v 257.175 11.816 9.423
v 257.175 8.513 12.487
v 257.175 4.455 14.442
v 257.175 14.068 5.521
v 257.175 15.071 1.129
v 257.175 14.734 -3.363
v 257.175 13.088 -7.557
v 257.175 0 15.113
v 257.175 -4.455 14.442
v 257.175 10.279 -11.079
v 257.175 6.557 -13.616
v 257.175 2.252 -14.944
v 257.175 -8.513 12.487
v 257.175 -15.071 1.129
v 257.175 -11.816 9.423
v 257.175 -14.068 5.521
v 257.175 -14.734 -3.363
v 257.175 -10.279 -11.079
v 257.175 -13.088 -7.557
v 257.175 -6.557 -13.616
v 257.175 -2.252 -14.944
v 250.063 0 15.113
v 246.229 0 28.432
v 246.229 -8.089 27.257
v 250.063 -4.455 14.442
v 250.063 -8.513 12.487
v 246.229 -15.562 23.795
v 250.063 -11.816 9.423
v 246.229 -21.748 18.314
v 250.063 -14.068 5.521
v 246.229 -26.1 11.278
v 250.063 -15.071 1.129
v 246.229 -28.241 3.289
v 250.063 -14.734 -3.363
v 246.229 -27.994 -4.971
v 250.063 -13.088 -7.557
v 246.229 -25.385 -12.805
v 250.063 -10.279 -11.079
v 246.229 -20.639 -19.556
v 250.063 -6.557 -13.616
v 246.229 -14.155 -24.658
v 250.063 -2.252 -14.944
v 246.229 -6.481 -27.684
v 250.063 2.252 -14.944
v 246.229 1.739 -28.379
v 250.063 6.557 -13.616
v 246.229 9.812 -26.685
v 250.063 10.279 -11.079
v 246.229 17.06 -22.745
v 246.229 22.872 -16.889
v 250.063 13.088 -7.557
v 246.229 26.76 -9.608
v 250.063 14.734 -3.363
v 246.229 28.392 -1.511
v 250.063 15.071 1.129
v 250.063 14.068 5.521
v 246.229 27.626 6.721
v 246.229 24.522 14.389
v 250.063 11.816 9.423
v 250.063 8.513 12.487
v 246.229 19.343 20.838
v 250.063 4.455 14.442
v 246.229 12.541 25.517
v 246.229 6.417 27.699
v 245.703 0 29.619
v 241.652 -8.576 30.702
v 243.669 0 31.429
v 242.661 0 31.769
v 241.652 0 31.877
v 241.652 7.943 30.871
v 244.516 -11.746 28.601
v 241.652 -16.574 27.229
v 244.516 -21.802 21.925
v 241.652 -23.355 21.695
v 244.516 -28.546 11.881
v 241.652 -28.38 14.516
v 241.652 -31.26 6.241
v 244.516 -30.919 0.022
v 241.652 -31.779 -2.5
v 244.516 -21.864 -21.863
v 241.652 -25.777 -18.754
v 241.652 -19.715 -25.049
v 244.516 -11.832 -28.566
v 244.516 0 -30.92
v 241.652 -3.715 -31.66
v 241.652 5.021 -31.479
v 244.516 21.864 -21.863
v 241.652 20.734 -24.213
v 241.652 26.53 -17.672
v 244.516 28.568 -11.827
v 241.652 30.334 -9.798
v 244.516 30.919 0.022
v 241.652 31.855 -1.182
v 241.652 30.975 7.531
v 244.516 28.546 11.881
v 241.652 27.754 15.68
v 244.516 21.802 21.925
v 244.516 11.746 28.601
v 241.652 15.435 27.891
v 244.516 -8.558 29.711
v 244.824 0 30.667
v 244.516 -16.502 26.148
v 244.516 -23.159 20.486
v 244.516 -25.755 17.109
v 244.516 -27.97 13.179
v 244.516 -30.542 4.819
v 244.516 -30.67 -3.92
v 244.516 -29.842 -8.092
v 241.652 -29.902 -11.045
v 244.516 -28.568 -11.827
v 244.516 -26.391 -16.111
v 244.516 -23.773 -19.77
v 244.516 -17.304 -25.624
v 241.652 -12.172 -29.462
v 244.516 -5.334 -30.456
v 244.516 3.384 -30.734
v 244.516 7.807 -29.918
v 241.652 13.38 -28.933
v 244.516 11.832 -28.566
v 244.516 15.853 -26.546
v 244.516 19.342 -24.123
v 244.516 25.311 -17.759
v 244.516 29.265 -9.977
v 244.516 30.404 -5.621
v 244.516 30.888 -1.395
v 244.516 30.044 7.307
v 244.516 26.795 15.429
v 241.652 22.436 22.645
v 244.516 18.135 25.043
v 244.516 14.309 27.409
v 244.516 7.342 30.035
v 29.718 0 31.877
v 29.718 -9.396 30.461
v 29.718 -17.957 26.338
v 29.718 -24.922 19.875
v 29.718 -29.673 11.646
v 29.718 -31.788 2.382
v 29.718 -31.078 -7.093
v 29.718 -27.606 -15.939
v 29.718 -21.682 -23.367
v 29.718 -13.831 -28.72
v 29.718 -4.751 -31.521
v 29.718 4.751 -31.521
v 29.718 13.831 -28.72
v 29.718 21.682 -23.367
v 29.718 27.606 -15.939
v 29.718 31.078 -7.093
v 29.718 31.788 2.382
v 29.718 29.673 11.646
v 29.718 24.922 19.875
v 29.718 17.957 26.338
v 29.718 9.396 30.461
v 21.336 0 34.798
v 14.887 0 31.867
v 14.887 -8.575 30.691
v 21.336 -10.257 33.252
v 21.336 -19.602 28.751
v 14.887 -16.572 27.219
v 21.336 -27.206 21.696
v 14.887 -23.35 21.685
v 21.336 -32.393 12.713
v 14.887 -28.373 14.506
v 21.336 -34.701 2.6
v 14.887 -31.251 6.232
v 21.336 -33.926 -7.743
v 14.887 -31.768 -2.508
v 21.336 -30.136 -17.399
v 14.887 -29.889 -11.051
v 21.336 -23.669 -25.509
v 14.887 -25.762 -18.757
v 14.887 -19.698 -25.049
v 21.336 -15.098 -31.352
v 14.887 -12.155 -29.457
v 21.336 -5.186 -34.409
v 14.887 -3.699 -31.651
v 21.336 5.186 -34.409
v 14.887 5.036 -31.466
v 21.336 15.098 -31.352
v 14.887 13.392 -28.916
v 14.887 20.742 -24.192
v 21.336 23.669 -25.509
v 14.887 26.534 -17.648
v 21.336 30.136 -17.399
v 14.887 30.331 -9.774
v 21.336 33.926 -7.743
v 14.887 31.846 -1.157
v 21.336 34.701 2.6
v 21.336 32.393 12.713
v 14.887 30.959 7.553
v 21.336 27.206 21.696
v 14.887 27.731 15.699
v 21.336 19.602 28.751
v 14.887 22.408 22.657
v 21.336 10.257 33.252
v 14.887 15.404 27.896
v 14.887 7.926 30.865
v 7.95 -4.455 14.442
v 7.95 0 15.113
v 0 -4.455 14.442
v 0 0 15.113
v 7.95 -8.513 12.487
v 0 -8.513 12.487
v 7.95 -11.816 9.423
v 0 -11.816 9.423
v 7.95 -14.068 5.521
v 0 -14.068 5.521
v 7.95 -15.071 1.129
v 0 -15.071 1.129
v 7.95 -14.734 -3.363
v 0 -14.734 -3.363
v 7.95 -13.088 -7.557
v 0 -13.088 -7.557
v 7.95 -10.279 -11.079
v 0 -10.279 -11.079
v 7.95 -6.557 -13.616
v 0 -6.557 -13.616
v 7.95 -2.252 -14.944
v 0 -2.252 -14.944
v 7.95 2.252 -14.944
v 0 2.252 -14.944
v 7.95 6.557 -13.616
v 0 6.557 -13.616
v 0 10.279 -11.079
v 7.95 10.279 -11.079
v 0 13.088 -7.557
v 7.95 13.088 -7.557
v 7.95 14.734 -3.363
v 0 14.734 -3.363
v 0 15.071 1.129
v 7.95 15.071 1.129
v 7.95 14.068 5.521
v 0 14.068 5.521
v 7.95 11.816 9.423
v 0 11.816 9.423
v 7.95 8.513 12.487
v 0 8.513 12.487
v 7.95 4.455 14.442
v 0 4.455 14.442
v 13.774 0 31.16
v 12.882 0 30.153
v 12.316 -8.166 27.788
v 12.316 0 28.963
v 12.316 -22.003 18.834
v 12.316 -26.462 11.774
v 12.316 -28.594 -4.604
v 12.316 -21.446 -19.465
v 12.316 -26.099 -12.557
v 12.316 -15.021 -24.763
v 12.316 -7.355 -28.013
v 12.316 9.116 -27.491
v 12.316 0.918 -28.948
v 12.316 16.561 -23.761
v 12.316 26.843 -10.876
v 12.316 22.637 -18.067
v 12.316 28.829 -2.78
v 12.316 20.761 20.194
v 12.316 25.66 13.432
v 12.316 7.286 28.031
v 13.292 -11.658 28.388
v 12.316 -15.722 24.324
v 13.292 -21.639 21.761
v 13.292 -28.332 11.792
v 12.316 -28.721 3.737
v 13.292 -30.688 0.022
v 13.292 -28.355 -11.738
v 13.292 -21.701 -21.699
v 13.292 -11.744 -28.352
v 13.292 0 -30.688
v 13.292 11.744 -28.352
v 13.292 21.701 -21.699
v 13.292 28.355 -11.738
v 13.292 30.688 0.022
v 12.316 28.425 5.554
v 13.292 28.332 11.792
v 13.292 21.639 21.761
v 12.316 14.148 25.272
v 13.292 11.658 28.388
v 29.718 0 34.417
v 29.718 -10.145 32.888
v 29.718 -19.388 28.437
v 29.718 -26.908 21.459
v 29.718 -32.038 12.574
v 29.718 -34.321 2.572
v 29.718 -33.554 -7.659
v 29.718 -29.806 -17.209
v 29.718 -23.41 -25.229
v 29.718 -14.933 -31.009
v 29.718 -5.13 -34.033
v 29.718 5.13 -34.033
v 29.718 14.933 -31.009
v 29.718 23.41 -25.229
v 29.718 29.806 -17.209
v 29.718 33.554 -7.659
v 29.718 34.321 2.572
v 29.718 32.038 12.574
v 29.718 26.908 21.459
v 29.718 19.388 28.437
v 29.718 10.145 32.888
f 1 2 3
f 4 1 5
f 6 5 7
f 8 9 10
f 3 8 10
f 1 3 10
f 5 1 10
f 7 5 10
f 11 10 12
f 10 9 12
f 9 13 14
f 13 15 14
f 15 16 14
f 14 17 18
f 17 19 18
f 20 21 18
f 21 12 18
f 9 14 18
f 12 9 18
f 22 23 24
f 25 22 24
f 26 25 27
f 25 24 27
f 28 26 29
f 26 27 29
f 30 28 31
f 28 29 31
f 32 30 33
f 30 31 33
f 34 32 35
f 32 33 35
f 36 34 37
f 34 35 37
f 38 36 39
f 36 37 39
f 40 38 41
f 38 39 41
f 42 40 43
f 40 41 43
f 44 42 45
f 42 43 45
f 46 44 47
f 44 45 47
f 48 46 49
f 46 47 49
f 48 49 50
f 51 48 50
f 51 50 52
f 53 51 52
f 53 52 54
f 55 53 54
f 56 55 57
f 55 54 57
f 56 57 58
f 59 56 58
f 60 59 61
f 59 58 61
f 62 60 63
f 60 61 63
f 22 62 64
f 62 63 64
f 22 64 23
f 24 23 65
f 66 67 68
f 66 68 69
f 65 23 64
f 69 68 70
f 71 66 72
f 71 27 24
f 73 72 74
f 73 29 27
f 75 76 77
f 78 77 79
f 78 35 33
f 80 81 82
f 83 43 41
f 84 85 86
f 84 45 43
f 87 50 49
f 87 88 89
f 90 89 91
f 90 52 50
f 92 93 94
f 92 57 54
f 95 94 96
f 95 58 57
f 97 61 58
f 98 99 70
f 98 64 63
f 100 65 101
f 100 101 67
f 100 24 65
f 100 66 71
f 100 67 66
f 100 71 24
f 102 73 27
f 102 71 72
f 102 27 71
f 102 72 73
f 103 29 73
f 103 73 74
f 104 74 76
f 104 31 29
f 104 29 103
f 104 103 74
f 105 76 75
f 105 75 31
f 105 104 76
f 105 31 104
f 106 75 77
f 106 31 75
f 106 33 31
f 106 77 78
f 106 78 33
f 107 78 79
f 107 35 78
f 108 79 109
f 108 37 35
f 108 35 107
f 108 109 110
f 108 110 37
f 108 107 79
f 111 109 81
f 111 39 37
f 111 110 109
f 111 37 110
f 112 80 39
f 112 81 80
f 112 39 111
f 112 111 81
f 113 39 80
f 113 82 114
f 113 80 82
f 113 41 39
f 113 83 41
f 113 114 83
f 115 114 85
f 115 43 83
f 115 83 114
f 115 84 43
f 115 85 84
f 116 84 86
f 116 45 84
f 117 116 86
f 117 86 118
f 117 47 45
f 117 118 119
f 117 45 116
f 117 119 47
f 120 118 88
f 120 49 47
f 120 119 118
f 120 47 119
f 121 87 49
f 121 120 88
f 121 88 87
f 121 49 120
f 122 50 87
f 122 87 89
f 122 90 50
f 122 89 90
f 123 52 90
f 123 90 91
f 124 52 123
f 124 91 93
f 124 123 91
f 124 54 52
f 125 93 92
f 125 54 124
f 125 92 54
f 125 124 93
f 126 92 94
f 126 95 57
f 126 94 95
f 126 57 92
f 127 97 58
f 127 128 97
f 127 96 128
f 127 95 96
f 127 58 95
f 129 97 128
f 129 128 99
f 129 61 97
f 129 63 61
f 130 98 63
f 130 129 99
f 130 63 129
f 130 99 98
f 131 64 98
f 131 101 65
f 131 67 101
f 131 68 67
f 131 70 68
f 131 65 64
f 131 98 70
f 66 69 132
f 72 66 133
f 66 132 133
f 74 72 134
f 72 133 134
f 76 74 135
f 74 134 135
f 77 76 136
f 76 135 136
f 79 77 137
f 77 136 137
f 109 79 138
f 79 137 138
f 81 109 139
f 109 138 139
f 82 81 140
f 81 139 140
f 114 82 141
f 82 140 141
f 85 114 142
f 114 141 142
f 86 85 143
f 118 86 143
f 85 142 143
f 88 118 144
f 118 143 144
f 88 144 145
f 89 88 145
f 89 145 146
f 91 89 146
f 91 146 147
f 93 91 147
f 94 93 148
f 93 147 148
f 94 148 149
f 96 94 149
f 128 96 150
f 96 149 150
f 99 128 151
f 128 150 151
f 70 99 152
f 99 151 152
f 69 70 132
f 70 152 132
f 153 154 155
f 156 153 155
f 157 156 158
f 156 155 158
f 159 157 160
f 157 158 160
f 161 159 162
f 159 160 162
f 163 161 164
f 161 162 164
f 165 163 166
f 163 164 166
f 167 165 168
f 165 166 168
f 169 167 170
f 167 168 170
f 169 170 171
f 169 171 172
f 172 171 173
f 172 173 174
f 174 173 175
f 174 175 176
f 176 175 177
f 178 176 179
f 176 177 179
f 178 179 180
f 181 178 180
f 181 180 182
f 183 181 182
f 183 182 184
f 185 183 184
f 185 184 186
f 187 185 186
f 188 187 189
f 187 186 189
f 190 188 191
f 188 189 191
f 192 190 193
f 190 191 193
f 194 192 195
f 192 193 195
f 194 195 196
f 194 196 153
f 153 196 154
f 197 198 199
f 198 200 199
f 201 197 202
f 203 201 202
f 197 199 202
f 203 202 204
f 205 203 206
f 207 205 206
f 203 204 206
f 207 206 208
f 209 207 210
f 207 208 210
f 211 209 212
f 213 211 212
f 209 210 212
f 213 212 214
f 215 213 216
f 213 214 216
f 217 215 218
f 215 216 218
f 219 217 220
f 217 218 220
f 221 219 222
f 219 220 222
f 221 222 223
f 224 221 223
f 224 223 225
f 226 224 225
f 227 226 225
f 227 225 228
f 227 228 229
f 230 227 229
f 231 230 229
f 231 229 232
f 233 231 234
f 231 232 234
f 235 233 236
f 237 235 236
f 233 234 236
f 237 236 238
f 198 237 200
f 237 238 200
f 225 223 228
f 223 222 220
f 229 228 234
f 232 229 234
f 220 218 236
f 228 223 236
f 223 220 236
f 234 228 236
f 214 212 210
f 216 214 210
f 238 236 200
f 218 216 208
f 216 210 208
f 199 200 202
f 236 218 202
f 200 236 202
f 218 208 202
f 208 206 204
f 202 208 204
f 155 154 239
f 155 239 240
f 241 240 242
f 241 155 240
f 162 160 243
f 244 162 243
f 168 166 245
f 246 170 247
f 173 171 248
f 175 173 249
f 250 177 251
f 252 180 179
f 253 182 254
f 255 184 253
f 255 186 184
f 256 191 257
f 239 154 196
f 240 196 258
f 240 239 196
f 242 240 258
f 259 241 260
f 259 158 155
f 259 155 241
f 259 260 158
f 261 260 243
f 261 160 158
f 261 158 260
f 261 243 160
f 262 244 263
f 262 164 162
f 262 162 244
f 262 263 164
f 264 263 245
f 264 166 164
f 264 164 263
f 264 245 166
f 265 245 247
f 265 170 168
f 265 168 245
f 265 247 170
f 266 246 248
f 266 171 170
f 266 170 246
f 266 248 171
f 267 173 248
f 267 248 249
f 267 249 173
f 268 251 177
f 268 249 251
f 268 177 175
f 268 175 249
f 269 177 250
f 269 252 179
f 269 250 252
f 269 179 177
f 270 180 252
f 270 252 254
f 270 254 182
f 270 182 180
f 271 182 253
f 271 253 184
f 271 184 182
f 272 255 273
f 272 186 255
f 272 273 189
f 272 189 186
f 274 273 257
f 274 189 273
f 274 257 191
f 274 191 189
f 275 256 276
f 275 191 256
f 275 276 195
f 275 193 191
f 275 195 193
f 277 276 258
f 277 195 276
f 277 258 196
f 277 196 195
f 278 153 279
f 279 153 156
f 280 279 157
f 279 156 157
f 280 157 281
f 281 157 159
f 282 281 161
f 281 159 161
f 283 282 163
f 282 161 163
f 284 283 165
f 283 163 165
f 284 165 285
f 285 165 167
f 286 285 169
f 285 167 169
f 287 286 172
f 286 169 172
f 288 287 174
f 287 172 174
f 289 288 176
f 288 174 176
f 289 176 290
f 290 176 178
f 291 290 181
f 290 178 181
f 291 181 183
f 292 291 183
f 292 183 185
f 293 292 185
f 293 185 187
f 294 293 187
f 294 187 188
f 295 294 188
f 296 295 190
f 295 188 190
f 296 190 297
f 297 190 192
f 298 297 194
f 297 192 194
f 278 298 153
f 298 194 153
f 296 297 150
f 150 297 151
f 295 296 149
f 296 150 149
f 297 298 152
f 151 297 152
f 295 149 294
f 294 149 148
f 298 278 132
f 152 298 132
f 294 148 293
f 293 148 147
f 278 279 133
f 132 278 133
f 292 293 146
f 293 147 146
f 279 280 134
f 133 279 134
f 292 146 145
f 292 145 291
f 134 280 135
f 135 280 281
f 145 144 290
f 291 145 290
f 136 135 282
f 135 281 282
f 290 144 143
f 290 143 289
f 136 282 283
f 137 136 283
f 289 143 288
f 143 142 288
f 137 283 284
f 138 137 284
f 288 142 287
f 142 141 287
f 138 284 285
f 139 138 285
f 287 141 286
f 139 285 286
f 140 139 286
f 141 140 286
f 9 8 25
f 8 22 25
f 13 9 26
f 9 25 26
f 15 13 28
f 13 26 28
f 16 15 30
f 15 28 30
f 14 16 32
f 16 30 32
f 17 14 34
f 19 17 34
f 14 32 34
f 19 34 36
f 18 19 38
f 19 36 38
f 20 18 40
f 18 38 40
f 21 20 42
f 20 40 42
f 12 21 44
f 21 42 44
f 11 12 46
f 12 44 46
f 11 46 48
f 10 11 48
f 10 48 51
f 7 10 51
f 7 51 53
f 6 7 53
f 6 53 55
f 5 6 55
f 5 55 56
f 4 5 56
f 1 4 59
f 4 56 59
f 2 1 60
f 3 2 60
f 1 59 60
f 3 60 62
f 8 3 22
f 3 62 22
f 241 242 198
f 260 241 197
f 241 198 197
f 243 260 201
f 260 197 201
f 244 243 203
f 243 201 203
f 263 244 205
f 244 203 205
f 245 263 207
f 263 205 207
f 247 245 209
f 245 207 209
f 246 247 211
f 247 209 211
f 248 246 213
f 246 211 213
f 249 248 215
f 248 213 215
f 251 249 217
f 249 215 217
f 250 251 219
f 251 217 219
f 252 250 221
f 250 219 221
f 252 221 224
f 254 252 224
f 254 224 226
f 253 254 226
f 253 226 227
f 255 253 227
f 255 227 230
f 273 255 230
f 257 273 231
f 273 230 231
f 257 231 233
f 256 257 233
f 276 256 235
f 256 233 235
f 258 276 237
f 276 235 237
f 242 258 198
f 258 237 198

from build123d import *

# Parameters (mm, degrees)
FILLET1_R = 4.7625


with BuildPart() as part:
    # Sketch1 → Revolve1 (revolve)
    with BuildSketch(Plane.XY, mode=Mode.PRIVATE) as revolve1_sk:
        Polygon((257.175, 0), (257.175, 15.113), (250.063, 15.113), (245.237, 31.877), (29.718, 31.877), (29.718, 34.417), (21.336, 34.798), (12.954, 30.988), (7.9502, 15.113), (0, 15.113), (0, 0), align=None)
    revolve(revolve1_sk.sketch.rotate(Axis((0, 0, 0), (1, 0, 0)), 90), axis=Axis((0, 0, 0), (1, 0, 0)))

    # Fillet1
    fillet1_edges = [part.edges().sort_by_distance(p)[0] for p in [
        (12.954, 0, -30.988),
        (245.237, 0, -31.877),
    ]]
    fillet(fillet1_edges, radius=FILLET1_R)


solid = part.part
